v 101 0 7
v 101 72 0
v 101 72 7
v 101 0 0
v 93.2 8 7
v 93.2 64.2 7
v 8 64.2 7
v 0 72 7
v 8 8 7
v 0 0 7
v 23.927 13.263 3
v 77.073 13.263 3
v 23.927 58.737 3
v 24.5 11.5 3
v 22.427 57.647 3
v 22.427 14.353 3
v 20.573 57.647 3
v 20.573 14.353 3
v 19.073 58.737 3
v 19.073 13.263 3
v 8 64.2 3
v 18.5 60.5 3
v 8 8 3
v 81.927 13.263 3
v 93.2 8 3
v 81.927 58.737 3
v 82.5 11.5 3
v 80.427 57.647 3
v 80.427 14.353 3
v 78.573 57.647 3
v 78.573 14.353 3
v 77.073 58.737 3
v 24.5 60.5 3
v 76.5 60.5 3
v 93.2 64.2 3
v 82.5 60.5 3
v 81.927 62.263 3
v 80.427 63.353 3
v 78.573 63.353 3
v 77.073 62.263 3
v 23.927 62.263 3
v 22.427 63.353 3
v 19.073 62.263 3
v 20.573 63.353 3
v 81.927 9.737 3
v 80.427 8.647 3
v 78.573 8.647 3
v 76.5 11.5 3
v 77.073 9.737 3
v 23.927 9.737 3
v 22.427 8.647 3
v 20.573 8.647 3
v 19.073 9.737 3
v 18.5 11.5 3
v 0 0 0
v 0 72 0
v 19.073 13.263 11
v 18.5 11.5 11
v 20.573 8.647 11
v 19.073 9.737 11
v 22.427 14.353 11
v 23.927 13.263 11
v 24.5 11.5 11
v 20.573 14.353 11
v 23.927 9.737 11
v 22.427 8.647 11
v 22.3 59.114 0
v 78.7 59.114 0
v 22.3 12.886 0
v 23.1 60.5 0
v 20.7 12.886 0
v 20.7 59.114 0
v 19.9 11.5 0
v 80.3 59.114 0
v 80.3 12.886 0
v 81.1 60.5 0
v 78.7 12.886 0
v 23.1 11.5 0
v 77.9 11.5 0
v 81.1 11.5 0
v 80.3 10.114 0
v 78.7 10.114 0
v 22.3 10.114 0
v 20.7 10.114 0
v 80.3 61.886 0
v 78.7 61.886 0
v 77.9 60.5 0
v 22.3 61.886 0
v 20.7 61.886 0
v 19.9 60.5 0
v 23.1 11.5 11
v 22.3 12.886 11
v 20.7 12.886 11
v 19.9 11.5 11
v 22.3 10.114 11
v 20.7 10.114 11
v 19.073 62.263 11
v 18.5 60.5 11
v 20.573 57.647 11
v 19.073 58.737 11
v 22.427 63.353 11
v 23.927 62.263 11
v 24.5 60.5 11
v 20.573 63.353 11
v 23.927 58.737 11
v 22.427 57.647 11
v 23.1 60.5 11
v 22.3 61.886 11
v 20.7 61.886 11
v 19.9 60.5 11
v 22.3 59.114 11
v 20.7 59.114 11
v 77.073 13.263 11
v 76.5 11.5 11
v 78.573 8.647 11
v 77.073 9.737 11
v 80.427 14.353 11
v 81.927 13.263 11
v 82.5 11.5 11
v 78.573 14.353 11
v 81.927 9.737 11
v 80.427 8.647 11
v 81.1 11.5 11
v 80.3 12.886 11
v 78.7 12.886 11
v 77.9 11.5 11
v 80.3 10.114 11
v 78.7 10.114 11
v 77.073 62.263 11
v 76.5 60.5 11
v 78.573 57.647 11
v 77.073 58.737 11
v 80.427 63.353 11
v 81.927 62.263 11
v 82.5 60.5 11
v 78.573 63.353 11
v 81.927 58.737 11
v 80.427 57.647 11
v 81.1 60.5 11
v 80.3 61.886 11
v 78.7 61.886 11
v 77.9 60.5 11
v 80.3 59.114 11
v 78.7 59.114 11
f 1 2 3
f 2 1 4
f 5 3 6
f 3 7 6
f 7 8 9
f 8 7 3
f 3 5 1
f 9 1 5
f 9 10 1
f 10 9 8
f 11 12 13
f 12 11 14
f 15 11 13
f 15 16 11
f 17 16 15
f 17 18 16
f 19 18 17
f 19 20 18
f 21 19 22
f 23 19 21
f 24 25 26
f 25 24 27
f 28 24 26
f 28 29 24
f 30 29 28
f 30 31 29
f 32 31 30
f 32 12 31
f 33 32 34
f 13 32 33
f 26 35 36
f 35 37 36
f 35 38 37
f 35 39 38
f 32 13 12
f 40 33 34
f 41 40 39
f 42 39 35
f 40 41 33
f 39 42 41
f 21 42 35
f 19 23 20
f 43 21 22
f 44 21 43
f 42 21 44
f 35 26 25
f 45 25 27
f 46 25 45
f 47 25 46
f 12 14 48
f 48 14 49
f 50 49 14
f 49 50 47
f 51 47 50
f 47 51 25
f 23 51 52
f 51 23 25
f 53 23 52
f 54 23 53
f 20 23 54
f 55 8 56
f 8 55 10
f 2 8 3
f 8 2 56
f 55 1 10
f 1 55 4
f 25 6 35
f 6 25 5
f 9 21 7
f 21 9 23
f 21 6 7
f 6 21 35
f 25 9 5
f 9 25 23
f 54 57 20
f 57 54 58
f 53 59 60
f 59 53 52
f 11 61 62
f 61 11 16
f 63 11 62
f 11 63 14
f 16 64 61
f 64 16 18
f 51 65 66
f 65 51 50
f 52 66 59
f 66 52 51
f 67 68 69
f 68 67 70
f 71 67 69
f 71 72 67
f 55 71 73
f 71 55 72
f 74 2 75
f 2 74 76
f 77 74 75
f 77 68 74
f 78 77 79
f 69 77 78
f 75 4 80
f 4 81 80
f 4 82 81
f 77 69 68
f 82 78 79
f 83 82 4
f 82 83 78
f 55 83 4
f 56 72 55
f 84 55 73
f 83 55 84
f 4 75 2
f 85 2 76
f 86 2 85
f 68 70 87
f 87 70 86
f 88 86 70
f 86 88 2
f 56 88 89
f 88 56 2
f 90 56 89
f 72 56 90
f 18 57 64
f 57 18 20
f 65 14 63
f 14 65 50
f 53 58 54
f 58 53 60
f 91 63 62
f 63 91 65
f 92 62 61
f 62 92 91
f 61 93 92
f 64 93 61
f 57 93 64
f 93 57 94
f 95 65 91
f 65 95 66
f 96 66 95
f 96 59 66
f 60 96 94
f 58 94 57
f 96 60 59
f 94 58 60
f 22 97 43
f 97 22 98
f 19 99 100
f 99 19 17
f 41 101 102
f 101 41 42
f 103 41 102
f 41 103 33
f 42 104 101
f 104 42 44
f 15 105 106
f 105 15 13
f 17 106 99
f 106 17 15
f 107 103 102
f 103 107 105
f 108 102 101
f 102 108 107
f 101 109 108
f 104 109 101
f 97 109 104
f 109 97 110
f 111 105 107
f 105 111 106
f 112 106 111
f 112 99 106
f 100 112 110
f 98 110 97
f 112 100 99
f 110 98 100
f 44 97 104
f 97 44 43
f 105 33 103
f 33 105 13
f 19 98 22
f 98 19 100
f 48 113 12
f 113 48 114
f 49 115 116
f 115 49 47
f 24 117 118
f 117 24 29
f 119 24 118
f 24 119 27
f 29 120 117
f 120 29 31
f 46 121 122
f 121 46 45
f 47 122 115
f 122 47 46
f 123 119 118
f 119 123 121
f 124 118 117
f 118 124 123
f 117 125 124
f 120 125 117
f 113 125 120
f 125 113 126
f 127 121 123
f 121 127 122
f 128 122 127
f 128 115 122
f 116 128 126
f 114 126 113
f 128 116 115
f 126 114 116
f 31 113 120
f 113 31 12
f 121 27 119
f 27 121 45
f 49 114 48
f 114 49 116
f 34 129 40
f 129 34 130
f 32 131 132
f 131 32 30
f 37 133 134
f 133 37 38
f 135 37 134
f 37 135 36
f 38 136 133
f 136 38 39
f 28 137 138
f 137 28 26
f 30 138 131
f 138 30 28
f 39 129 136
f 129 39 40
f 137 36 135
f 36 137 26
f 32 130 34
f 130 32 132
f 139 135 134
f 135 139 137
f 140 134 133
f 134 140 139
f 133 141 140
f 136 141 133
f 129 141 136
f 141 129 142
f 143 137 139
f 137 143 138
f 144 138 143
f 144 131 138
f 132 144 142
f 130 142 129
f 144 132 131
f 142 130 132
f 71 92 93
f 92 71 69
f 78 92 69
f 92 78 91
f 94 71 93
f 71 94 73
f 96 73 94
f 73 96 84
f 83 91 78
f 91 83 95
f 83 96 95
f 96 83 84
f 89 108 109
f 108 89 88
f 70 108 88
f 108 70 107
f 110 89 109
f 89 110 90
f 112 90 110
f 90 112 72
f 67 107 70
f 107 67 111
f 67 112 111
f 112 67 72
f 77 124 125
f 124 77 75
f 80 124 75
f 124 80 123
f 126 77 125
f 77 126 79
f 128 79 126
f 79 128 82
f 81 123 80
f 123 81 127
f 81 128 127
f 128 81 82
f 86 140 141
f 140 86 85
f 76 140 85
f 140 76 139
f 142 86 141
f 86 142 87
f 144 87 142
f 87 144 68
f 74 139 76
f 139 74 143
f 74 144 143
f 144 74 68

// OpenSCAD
// orcad: tray that carries a printed circuit board on four screw-in stand-offs.
board_length = 85;
board_width = 56;
hole_spacing_x = 58;
hole_spacing_y = 49;
mount_hole_diameter = 3.2;
standoff_diameter = 6;
standoff_height = 8;
base_thickness = 3;
wall_height = 4;

base_margin = standoff_diameter + 2;
base_x = board_length + 2 * base_margin;
base_y = board_width + 2 * base_margin;

difference() {
    union() {
        cube([base_x, base_y, base_thickness]);

        // Rim, when the board should sit in a shallow tray instead of on bare stand-offs.
        if (wall_height > 0)
            translate([0, 0, base_thickness])
                difference() {
                    cube([base_x, base_y, wall_height]);
                    translate([base_margin, base_margin, -0.01])
                        cube([board_length + 0.2, board_width + 0.2, wall_height + 0.02]);
                }

        for (x = [-1, 1], y = [-1, 1])
            translate([base_x / 2 + x * hole_spacing_x / 2, base_y / 2 + y * hole_spacing_y / 2, 0])
                cylinder(d = standoff_diameter, h = base_thickness + standoff_height);
    }

    for (x = [-1, 1], y = [-1, 1])
        translate([base_x / 2 + x * hole_spacing_x / 2, base_y / 2 + y * hole_spacing_y / 2, -0.01])
            cylinder(d = mount_hole_diameter, h = base_thickness + standoff_height + 0.02);
}
